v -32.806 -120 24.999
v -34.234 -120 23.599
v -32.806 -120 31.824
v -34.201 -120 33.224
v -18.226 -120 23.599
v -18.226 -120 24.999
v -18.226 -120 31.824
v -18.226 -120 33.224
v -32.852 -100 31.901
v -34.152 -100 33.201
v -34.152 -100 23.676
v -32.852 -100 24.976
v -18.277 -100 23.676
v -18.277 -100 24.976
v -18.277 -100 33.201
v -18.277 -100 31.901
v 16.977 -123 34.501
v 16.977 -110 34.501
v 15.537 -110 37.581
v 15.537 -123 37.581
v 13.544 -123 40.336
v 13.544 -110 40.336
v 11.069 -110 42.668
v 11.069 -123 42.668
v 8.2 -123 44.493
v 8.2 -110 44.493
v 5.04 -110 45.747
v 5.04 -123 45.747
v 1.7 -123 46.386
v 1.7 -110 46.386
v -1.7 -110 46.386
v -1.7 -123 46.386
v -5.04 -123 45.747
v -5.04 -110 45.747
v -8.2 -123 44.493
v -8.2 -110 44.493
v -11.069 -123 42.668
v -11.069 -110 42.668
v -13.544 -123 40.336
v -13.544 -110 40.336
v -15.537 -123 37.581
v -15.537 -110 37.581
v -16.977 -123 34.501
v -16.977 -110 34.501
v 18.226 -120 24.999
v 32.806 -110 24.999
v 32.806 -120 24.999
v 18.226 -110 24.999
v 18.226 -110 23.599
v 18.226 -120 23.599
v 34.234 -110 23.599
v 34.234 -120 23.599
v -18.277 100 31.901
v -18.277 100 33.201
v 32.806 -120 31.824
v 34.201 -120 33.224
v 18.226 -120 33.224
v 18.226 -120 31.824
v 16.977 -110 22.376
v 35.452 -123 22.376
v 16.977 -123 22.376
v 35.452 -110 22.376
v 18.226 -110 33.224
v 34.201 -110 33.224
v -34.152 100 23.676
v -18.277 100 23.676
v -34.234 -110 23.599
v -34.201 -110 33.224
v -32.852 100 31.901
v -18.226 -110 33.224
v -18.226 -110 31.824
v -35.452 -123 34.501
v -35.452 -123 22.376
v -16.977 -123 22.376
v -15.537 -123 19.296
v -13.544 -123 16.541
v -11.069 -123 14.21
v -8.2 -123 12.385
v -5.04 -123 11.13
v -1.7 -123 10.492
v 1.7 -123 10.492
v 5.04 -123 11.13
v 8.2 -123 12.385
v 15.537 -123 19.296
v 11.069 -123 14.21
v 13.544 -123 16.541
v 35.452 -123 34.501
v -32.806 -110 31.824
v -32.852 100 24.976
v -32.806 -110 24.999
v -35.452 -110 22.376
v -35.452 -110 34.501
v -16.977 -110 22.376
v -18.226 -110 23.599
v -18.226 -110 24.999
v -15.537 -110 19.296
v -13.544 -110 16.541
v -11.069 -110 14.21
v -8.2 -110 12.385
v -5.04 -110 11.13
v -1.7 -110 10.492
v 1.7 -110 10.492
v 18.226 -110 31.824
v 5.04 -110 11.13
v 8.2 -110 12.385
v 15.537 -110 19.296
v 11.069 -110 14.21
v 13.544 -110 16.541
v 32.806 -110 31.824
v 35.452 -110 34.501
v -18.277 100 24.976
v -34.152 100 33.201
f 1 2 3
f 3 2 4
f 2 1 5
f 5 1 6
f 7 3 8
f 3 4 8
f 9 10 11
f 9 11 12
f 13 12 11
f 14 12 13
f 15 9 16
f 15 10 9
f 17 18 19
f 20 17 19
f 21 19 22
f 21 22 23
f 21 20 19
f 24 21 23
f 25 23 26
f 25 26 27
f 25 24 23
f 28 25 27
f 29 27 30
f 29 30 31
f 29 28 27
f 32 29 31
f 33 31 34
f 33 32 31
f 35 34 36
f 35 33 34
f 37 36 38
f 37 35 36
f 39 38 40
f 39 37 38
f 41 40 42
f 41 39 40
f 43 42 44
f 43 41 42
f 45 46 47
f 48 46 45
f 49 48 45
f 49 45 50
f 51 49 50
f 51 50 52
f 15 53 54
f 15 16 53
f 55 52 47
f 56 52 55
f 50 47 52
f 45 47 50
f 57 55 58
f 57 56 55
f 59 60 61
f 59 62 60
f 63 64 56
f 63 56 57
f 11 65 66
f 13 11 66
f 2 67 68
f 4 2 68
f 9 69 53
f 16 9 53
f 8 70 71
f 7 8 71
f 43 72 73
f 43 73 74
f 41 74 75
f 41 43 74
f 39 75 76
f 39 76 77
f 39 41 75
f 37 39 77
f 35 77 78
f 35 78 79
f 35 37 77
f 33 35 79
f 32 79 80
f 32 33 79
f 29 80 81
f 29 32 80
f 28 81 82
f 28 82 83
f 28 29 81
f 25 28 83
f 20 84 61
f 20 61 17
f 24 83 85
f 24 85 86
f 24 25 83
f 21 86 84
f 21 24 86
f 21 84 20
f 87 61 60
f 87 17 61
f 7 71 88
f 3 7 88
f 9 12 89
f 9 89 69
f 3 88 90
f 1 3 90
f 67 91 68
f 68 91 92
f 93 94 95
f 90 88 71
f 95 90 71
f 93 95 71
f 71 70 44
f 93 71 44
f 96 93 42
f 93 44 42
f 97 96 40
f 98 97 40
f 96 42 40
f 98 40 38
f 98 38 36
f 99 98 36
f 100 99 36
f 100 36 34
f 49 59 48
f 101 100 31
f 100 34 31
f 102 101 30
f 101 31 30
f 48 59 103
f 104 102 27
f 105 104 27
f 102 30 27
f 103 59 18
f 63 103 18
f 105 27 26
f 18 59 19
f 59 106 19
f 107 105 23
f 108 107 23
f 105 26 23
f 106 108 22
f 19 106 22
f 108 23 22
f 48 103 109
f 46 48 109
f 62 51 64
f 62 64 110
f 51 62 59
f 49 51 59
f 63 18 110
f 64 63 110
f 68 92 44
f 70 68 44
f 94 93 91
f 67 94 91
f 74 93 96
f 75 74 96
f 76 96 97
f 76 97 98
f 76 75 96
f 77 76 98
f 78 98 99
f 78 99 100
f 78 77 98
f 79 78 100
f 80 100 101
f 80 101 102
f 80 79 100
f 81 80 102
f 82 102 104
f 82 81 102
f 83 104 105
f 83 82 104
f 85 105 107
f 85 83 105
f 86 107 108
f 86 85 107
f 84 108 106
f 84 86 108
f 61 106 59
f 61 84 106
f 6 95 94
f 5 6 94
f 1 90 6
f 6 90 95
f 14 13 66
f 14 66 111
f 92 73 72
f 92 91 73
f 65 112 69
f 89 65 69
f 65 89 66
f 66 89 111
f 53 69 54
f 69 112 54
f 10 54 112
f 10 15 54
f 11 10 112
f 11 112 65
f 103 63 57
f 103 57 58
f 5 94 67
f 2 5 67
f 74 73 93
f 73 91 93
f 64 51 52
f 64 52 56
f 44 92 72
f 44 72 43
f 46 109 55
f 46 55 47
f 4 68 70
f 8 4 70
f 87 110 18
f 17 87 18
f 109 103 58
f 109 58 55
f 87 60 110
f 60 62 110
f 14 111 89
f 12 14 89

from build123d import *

# Parameters (mm, degrees)
F1_DEPTH = 100
F3_W     = 18.475
F3_H     = 12.125
F4_DEPTH = 10
F5_W     = 18.475
F5_H     = 12.125
F6_DEPTH = 3
F8_W     = 33.9545609808
F8_H     = 12.125
F9_DEPTH = 13


with BuildPart() as f1:
    # F0 (on Front) → F1 (new body, symmetric)
    with BuildSketch(Plane.XZ):
        Polygon((-18.2772804904, 33.2013138086), (-34.1522804904, 33.2013138086), (-34.1522804904, 23.6763138086), (-18.2772804904, 23.6763138086), (-18.2772804904, 24.9763138086), (-32.8522804904, 24.9763138086), (-32.8522804904, 31.9013138086), (-18.2772804904, 31.9013138086), align=None)
    extrude(amount=F1_DEPTH, both=True)


with BuildPart() as f4:
    # F3 (on offset) → F4 (new body)
    with BuildSketch(Plane.XZ.offset(110)):
        with Locations((-26.2147804904, 28.4388138086)):
            Rectangle(F3_W, F3_H)
        Polygon((-34.234100264, 23.5990439316), (-34.2011767374, 33.2239876219), (-18.2261767374, 33.2239876219), (-18.2261767374, 31.8239876219), (-32.8059656421, 31.8239876219), (-32.8059656421, 24.9990439316), (-18.2261767374, 24.9990439316), (-18.2261767374, 23.5990439316), align=None, mode=Mode.SUBTRACT)
    extrude(amount=F4_DEPTH)

    # F5 (on face) → F6 (join)
    with BuildSketch(Plane.XZ.offset(120)):
        with Locations((-26.2147804904, 28.4388138086)):
            Rectangle(F5_W, F5_H)
    extrude(amount=F6_DEPTH)


with BuildPart() as f7_1:
    # F7: instance of F4
    add(f4.part.mirror(Plane.YZ))


with BuildPart() as f4_1:
    add(f4.part)

    add(f7_1.part)  # F9 merges F7_1
    # F8 (on face) → F9 (join, through all)
    with BuildSketch(Plane.XZ.offset(123)):
        with Locations((0, 28.4388138086)):
            Rectangle(F8_W, F8_H)
        with BuildLine():
            ThreePointArc((16.9772804904, 34.5013138086), (0, 46.4660698144), (-16.9772804904, 34.5013138086))
            Line((-16.9772804904, 34.5013138086), (16.9772804904, 34.5013138086))
        make_face()
        with BuildLine():
            Line((16.9772804904, 22.3763138086), (-16.9772804904, 22.3763138086))
            ThreePointArc((-16.9772804904, 22.3763138086), (0, 10.4115578028), (16.9772804904, 22.3763138086))
        make_face()
    extrude(amount=-F9_DEPTH)


solid = Compound([f1.part, f4_1.part])
